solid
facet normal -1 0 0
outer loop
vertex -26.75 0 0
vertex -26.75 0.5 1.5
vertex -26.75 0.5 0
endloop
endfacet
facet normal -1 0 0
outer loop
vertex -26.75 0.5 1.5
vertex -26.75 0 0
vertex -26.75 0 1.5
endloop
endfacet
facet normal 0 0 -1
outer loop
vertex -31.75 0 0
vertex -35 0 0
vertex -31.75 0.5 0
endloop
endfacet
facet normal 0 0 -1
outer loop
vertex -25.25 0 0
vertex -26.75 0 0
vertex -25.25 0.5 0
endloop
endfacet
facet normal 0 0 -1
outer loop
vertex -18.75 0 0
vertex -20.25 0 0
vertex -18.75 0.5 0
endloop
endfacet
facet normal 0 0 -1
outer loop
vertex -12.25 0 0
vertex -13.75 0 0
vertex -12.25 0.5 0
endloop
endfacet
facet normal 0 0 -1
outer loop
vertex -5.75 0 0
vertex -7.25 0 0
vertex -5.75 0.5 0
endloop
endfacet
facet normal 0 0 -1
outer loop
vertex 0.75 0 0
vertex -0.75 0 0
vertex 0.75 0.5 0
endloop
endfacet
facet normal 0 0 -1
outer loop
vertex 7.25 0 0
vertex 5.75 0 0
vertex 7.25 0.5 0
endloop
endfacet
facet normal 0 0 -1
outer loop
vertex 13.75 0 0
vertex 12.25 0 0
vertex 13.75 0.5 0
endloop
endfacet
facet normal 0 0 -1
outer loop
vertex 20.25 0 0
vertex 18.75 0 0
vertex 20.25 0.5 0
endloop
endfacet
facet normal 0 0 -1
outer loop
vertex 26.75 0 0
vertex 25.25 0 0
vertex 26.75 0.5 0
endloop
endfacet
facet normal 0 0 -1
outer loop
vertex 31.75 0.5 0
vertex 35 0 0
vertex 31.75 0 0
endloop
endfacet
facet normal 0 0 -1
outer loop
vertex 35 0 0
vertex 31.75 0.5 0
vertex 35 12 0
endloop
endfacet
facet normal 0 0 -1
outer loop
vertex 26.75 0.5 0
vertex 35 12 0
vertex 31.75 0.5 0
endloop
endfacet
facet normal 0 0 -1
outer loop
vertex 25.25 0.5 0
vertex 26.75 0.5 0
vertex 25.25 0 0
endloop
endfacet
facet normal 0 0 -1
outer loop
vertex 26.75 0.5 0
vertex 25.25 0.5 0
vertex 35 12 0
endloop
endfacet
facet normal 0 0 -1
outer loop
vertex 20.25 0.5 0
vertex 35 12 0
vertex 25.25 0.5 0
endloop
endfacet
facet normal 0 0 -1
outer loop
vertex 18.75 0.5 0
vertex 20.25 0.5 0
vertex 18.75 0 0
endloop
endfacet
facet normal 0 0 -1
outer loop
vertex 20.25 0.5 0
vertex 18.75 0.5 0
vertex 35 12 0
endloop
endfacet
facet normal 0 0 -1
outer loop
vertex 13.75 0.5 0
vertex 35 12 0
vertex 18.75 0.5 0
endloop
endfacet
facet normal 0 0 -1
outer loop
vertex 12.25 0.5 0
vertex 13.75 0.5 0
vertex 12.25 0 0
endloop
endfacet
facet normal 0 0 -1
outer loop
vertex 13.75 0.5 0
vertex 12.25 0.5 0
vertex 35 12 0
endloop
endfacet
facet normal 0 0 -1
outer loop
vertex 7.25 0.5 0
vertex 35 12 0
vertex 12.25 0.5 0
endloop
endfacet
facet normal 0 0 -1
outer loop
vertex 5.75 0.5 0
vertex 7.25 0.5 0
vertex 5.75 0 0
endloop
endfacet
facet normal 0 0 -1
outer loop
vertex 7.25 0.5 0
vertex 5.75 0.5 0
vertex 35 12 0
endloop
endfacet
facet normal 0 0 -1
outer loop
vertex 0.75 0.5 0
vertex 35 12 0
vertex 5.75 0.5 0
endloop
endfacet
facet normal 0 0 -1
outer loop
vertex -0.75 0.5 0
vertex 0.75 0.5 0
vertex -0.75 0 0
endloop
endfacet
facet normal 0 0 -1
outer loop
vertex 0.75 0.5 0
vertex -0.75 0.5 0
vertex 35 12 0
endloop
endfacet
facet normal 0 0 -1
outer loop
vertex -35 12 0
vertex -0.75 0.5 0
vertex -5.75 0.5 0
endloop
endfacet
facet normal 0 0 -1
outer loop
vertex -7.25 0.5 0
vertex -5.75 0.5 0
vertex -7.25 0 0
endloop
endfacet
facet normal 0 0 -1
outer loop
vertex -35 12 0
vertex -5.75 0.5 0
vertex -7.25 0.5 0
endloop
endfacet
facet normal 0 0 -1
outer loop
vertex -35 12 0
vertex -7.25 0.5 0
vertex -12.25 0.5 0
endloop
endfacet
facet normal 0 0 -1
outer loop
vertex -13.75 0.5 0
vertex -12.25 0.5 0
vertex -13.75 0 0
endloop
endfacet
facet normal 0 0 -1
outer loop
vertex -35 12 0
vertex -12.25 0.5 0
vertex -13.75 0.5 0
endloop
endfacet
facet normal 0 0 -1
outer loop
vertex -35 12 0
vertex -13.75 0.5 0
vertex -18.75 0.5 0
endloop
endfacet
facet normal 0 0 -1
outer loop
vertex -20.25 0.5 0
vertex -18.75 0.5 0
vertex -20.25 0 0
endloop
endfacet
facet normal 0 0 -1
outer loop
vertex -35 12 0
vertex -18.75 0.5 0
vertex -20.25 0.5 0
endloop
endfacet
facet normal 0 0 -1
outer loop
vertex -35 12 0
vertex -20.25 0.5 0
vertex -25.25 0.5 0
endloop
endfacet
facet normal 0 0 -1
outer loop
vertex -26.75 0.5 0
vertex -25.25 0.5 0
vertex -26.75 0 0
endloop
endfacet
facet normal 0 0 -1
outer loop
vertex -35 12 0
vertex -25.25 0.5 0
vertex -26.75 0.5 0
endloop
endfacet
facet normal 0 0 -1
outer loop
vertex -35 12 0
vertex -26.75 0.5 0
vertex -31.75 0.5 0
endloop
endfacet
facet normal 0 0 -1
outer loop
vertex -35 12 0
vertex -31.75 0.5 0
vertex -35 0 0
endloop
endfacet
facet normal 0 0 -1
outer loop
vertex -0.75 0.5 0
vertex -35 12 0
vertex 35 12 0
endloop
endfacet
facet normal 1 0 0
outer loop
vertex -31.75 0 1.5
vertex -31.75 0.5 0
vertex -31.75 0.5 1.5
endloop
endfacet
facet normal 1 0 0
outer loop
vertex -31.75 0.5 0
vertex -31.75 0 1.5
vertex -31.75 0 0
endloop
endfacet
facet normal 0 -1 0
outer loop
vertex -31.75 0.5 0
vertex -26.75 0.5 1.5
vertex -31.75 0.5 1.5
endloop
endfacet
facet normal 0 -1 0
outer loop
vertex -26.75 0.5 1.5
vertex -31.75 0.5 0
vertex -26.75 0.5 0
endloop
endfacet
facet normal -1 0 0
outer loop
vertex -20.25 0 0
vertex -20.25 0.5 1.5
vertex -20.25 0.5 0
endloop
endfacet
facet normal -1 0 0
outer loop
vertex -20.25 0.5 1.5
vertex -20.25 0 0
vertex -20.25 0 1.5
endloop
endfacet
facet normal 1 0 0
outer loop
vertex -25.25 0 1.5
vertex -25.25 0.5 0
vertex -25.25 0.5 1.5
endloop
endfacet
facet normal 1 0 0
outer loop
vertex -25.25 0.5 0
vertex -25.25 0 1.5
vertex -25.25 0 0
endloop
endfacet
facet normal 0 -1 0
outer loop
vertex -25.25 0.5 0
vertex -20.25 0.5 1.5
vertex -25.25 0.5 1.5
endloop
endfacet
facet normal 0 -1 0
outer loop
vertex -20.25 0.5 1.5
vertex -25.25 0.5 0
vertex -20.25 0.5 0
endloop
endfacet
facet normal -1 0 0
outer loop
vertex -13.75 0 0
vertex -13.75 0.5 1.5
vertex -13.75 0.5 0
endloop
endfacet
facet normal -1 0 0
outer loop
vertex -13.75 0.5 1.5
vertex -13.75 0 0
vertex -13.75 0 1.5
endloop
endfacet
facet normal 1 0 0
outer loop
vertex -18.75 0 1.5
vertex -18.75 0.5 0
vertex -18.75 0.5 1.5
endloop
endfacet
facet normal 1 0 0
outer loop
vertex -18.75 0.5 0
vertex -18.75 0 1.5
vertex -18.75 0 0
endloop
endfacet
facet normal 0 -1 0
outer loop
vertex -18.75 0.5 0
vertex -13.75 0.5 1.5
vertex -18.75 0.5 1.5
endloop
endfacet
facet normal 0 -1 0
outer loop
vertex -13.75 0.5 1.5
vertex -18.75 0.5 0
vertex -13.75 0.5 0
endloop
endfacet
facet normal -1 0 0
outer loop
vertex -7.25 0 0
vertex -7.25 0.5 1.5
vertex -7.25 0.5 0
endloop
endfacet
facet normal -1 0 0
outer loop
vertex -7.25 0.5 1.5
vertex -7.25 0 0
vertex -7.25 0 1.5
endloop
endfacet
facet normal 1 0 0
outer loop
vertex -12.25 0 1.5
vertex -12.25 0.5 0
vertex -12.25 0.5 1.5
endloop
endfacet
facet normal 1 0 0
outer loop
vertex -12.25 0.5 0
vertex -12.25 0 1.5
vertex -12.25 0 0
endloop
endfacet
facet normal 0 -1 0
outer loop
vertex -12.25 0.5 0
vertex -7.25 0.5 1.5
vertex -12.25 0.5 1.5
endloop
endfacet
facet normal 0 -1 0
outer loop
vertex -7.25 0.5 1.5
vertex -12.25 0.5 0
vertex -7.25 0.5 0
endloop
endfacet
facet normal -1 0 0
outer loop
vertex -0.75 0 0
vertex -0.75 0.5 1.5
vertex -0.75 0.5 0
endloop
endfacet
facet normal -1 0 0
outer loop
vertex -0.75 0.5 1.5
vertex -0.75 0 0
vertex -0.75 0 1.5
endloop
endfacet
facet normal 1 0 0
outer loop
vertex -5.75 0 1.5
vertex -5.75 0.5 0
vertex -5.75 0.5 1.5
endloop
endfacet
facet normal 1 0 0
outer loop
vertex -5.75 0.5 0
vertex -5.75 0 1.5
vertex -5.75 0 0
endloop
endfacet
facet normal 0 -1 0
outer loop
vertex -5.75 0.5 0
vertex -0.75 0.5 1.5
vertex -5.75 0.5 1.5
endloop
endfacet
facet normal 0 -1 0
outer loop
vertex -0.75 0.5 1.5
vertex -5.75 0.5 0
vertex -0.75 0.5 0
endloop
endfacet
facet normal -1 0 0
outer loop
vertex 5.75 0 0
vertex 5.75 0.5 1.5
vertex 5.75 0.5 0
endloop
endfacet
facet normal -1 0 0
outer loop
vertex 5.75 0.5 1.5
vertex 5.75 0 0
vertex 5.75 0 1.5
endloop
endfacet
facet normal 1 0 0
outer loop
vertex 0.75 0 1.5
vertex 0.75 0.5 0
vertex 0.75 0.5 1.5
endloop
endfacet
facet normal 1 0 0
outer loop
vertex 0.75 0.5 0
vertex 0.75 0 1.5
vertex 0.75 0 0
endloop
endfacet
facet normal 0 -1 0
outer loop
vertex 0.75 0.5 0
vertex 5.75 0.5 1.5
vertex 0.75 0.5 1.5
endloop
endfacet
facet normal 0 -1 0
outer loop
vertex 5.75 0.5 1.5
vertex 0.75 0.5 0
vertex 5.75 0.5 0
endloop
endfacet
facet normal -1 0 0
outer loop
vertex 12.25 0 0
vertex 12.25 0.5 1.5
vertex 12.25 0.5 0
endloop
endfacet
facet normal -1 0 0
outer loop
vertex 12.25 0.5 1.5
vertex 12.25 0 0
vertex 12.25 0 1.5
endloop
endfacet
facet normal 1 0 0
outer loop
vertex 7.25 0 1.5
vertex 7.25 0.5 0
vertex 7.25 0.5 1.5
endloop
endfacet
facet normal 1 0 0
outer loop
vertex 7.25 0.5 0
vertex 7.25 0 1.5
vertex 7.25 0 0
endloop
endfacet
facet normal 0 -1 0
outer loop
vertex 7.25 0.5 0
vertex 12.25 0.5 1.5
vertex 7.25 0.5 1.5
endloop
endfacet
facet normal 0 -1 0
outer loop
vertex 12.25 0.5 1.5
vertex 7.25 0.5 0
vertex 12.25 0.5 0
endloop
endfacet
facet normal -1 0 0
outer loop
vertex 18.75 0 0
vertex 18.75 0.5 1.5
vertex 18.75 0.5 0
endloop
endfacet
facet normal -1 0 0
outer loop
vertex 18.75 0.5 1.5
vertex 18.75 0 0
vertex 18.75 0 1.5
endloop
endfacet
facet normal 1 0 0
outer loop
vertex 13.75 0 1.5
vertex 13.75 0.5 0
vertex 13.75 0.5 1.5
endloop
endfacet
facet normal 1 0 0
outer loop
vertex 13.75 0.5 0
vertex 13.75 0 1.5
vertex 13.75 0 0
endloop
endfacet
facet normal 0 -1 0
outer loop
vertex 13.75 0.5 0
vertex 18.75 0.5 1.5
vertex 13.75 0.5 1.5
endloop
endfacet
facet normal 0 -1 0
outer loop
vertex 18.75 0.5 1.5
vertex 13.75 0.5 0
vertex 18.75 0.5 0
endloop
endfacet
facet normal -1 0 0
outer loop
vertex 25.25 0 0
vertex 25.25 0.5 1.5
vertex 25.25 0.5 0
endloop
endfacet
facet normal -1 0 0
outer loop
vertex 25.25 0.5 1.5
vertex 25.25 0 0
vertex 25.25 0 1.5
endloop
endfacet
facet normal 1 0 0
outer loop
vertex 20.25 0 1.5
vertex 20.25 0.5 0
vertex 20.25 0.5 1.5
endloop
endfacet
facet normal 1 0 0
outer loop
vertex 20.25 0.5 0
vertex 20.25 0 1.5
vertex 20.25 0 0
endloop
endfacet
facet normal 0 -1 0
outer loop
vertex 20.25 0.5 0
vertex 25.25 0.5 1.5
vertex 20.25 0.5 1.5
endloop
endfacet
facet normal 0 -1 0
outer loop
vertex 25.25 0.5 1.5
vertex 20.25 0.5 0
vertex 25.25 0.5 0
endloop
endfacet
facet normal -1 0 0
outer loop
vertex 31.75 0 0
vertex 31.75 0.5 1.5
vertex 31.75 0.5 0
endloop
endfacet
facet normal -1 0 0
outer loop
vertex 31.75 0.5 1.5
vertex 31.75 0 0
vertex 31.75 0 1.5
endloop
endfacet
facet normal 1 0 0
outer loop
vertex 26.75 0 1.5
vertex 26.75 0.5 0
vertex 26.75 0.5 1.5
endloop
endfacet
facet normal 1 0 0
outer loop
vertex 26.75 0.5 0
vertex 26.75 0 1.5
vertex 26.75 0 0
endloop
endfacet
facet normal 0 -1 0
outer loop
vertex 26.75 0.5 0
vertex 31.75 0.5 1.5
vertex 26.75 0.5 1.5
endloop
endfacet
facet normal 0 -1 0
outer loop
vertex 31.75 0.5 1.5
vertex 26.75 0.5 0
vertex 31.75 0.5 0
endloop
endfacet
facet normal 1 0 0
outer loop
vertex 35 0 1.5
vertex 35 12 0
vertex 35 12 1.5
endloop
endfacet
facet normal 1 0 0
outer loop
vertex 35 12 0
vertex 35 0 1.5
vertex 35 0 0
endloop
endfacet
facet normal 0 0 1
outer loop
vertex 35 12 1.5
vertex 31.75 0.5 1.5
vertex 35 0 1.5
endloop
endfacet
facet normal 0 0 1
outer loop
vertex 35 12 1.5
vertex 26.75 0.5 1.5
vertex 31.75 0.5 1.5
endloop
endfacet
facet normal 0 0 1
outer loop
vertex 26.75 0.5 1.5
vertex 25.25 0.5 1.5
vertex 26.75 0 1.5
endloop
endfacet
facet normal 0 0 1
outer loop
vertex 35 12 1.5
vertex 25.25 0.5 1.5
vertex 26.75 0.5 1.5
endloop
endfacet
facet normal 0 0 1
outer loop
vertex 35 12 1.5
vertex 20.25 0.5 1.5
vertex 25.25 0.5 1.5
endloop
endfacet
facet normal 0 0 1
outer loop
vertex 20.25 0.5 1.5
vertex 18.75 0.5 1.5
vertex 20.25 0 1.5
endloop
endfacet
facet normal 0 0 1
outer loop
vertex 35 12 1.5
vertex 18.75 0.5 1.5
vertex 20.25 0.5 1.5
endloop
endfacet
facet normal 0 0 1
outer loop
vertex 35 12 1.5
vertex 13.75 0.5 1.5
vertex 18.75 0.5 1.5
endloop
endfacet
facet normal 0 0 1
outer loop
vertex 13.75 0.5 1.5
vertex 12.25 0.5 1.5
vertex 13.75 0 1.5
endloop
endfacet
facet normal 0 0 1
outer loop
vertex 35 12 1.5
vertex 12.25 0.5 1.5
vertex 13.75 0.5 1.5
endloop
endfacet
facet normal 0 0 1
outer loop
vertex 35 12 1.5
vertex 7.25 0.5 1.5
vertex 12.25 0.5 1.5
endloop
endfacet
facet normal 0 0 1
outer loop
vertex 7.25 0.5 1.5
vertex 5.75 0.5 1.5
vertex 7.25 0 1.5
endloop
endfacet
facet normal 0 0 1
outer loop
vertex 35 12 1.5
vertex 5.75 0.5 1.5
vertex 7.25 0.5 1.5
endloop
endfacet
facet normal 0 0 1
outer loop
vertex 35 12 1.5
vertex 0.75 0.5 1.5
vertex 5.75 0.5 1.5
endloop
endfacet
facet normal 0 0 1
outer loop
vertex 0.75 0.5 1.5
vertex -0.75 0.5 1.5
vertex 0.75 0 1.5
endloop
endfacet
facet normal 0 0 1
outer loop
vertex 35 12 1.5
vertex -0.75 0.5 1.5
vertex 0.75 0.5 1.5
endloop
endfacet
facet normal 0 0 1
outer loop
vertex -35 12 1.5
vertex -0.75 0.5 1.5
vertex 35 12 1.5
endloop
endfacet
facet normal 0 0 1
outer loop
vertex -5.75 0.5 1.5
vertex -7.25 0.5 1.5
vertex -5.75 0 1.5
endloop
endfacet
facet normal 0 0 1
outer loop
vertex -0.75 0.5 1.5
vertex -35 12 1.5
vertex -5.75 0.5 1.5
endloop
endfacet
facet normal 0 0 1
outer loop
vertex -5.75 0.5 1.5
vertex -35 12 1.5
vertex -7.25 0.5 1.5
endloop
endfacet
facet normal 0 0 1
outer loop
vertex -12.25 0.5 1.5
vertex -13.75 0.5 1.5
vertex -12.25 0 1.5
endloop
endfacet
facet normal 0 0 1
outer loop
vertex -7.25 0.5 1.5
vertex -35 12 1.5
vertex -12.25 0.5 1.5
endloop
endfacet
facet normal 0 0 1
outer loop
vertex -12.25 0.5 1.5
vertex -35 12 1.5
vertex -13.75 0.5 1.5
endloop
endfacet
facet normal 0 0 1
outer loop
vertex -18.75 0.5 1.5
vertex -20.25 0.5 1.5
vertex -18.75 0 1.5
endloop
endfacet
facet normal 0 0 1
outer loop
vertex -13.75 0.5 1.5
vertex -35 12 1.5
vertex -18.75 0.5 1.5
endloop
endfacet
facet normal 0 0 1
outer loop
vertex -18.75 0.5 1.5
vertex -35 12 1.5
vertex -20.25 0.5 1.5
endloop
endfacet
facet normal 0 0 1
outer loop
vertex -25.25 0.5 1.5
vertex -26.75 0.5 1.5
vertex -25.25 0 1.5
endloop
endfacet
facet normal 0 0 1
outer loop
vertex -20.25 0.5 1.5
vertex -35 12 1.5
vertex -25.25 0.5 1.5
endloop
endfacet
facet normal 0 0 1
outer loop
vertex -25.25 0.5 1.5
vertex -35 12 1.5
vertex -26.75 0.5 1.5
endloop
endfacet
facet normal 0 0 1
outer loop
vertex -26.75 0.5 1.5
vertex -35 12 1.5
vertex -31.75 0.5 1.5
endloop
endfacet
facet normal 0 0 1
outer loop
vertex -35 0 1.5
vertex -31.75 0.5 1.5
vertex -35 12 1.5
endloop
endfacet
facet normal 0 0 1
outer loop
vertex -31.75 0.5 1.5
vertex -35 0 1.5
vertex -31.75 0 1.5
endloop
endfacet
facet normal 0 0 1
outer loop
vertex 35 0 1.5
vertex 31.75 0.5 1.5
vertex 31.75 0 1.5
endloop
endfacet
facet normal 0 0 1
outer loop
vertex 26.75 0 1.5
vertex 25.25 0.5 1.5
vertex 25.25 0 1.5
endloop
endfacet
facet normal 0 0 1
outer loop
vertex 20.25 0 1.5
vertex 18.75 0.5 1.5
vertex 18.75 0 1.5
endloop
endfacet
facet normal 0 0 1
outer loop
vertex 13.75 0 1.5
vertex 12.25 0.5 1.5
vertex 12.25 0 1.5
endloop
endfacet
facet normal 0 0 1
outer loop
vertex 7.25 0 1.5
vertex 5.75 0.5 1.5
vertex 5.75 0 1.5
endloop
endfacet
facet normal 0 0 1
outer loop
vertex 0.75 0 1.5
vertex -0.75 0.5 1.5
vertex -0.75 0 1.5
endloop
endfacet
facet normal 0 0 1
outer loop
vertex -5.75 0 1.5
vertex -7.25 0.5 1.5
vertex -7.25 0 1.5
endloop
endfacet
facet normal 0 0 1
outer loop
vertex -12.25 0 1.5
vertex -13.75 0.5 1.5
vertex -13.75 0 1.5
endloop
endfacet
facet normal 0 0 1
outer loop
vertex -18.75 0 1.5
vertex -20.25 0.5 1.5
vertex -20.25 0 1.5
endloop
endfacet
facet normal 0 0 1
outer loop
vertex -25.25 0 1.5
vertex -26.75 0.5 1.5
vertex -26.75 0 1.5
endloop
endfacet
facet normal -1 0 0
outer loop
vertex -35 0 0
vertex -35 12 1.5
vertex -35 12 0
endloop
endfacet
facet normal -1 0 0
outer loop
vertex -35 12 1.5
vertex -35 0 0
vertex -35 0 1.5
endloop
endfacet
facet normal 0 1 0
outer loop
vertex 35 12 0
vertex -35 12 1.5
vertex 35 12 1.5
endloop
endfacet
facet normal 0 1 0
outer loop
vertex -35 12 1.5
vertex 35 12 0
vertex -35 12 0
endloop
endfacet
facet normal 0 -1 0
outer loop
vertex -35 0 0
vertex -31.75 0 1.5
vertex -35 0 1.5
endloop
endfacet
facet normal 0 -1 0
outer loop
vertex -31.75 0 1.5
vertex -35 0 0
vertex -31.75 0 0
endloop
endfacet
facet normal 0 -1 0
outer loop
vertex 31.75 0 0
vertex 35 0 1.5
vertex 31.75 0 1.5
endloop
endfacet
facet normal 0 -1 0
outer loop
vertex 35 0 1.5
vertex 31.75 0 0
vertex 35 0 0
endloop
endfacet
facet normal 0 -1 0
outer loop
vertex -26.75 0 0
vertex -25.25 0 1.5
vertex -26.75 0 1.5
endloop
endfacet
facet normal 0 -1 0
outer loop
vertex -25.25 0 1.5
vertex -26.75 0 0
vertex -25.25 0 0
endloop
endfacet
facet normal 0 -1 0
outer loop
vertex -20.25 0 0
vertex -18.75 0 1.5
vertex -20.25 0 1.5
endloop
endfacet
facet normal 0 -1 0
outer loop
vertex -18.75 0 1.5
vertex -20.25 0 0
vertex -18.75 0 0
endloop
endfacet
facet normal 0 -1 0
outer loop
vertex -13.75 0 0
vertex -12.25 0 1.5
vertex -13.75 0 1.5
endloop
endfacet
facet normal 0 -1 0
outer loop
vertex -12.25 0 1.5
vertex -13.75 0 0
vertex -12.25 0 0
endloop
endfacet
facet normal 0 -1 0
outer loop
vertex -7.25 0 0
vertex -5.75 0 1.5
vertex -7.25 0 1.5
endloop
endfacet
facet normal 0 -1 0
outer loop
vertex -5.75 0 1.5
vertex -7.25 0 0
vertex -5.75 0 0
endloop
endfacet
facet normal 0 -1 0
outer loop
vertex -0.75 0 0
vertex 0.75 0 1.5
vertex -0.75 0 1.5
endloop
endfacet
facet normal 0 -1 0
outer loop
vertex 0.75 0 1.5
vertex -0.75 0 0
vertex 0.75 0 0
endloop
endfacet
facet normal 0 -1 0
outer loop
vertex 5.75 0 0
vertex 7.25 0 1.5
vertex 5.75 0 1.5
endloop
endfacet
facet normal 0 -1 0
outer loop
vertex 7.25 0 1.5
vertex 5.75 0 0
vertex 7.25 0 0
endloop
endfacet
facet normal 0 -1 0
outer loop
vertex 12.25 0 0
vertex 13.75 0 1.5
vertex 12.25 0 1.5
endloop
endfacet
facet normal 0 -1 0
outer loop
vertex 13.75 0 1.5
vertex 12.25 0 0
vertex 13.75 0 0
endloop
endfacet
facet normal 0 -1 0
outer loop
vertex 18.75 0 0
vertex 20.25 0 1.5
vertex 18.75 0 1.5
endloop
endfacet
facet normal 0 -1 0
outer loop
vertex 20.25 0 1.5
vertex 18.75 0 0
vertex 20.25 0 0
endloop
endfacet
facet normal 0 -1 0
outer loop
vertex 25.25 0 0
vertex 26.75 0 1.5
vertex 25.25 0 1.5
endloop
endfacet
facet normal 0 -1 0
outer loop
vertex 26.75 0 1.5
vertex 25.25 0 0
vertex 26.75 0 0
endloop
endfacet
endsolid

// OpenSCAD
// 10-well agarose gel comb, printed lying flat
// Units: mm

plate_t      = 1.5;   // plate thickness (Z)
spine_len    = 70;    // spine length (X)
spine_w      = 12;    // spine width (Y)
tooth_count  = 10;    // number of teeth
tooth_w      = 5.0;   // tooth width (X)
tooth_len    = 12;    // tooth length (Y)
gap          = 1.5;   // gap between teeth (X)
overcut      = 0.5;   // cutter overshoot past faces

$fn = 64;

pitch = tooth_w + gap;          // centre-to-centre spacing
x0    = -(tooth_count - 1) * pitch / 2;  // first tooth centre (row centred)

difference() {
    // Spine
    translate([-spine_len / 2, 0, 0])
        cube([spine_len, spine_w, plate_t]);

    // Teeth hanging in -Y
    for (i = [0 : tooth_count - 1])
        translate([x0 + i * pitch - tooth_w / 2,
                   -tooth_len, 0])
            cube([tooth_w, tooth_len + overcut, plate_t + overcut]);
}
